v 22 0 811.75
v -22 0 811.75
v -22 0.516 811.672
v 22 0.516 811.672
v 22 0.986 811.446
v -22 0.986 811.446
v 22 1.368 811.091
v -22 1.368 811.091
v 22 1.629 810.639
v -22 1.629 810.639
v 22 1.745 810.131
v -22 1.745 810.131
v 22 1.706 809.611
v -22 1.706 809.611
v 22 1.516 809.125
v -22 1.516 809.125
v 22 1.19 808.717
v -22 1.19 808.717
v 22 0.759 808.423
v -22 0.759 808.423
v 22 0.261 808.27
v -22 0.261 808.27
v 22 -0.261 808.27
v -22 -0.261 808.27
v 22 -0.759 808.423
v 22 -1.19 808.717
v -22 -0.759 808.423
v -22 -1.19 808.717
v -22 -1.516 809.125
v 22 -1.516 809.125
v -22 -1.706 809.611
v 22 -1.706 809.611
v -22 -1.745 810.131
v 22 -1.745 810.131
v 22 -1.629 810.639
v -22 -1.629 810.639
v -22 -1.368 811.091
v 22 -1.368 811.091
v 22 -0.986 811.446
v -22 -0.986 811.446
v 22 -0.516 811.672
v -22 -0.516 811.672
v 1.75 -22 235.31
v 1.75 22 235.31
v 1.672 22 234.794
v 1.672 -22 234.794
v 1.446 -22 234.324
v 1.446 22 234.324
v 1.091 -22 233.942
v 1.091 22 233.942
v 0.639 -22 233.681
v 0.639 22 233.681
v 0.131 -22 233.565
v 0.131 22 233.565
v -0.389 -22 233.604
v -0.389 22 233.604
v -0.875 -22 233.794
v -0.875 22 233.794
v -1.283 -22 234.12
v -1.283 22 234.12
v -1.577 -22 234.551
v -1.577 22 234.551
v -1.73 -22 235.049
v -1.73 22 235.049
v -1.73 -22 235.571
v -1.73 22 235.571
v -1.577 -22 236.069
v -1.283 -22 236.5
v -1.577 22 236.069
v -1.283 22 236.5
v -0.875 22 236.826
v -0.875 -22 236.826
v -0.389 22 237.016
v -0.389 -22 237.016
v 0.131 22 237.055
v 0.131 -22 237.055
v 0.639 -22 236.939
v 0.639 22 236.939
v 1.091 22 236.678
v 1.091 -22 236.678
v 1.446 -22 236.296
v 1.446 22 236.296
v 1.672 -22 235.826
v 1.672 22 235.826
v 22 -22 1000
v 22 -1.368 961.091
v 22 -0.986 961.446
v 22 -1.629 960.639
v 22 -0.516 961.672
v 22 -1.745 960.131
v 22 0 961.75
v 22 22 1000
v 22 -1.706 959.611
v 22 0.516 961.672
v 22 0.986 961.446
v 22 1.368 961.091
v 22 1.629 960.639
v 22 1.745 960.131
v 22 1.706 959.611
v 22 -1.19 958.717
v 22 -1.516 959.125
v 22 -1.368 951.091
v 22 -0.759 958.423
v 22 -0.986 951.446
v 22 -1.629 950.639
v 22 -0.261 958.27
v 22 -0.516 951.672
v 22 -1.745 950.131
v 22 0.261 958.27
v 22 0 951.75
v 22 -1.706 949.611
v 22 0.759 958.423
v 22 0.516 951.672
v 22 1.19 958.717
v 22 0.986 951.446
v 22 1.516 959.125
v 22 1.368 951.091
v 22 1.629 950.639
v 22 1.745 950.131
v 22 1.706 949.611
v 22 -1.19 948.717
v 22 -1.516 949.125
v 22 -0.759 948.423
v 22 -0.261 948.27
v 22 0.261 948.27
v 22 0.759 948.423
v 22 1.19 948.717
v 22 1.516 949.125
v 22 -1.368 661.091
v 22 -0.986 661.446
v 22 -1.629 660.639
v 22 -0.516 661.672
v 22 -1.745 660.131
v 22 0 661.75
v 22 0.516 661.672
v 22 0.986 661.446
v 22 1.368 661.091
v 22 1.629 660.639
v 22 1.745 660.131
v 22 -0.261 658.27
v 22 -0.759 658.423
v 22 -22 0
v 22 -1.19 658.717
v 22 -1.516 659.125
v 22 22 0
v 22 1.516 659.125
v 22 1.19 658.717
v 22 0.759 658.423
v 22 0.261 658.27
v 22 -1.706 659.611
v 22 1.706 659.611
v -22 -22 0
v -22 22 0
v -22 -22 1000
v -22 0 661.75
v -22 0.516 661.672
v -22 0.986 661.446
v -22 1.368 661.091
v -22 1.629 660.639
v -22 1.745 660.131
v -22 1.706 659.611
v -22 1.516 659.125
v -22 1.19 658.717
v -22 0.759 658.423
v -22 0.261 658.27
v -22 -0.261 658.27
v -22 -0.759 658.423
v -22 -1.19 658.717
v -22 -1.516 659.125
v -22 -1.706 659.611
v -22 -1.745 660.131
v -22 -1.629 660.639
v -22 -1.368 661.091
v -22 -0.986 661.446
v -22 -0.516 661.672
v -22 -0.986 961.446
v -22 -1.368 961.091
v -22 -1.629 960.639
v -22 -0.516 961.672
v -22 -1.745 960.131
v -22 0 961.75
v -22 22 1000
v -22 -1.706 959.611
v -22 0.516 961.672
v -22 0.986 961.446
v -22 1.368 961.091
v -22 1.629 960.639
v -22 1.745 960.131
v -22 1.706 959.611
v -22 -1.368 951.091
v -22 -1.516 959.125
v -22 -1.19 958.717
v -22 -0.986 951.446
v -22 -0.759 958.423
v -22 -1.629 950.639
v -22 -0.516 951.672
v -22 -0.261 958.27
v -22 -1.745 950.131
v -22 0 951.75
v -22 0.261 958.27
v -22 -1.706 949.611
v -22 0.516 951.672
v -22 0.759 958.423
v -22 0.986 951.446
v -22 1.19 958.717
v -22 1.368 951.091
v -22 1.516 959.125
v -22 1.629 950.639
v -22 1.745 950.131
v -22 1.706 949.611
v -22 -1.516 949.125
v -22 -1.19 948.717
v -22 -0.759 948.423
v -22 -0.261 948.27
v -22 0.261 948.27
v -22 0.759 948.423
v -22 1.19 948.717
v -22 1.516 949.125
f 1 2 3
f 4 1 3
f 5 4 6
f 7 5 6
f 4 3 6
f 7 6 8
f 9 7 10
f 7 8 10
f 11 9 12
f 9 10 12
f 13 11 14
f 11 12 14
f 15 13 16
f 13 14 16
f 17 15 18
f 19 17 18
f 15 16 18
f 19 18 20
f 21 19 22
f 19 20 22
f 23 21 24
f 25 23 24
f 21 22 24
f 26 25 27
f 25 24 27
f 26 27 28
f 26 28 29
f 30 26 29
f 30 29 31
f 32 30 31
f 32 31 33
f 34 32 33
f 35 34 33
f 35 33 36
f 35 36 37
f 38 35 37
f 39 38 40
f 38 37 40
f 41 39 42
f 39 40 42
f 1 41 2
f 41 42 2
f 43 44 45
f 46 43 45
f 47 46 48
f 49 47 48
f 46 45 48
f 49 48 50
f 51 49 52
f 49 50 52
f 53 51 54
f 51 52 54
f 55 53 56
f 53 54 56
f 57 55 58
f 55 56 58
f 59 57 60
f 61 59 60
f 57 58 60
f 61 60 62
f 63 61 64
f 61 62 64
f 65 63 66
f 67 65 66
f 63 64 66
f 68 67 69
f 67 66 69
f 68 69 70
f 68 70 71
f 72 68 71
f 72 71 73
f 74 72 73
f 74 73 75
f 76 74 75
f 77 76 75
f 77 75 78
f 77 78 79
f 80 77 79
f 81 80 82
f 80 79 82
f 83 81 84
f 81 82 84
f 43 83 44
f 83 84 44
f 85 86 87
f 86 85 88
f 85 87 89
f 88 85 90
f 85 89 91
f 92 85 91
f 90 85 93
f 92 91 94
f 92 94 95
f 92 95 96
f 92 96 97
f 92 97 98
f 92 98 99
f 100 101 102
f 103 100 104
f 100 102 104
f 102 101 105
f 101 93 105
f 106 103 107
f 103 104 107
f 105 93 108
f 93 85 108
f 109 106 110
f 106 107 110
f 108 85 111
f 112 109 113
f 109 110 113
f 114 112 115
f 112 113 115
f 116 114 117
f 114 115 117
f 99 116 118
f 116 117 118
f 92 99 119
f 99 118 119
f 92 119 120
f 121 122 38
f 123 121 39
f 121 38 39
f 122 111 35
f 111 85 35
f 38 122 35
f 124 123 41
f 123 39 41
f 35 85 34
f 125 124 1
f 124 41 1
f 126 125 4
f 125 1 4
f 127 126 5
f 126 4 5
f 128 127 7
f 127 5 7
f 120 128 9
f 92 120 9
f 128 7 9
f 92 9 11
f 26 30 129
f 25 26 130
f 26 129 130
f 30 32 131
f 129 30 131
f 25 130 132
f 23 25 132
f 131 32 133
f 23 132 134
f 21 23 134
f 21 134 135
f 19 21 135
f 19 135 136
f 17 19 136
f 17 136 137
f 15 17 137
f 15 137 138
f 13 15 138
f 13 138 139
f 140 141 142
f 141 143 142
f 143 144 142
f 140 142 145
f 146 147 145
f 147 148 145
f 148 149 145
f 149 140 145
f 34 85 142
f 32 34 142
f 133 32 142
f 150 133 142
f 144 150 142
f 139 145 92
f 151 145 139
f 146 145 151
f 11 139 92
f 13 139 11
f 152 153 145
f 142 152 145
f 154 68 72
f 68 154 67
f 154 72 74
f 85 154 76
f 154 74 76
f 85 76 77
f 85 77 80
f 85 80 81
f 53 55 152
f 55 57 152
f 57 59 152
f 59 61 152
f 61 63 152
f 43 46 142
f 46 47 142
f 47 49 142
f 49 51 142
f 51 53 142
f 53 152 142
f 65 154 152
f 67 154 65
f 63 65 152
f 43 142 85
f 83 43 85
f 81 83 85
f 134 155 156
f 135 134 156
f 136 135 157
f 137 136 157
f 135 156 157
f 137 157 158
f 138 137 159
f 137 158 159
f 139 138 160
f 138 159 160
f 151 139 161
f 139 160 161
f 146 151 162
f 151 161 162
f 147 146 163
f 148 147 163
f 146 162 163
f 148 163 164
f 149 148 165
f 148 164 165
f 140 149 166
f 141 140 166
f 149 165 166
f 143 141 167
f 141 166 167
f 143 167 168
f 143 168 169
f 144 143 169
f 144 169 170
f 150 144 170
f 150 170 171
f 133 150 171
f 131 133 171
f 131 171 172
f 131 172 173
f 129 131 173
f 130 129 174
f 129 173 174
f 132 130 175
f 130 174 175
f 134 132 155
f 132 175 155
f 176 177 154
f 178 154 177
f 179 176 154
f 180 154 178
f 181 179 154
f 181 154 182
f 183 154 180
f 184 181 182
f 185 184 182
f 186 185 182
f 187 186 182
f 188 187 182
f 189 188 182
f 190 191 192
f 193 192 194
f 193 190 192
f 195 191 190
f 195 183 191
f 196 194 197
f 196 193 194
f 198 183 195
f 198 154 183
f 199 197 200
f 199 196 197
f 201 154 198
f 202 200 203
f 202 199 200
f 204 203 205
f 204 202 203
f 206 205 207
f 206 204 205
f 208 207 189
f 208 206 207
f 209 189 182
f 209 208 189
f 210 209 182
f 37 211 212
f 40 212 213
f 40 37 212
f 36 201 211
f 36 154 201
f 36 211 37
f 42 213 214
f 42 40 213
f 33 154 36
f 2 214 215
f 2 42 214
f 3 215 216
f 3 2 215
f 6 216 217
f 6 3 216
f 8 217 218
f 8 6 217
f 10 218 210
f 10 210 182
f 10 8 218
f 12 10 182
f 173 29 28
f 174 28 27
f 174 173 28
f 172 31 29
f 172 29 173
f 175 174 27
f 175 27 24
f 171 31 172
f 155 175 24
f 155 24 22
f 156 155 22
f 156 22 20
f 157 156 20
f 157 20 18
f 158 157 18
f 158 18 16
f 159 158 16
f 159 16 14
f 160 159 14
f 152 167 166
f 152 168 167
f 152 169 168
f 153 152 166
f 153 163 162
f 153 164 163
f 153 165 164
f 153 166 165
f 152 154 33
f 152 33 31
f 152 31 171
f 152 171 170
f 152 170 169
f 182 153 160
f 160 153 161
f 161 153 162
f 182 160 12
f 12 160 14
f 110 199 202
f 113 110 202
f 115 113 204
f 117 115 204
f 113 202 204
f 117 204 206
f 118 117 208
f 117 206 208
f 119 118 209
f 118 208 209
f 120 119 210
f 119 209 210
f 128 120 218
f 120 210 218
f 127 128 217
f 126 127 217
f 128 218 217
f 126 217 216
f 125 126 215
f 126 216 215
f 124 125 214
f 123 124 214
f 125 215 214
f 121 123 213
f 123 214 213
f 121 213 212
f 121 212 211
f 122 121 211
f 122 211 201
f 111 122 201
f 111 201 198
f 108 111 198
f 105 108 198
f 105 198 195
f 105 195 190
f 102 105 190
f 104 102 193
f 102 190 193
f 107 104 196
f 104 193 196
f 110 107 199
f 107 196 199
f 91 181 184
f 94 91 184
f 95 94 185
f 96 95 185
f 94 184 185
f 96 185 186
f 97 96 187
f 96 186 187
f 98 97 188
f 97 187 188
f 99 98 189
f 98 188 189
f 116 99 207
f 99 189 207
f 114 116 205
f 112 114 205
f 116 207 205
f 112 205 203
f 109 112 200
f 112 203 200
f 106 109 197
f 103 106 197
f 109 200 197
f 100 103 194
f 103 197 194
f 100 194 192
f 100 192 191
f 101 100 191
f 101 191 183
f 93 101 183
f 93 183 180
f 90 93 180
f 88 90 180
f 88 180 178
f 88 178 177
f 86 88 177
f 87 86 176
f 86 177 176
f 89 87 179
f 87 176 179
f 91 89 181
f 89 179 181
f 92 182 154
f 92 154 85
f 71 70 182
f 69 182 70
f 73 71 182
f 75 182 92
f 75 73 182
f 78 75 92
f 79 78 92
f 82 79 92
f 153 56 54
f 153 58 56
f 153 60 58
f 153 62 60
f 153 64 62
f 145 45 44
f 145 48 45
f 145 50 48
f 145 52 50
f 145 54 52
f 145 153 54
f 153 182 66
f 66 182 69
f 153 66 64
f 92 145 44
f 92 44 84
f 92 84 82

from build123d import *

# Parameters (mm, degrees)
ESQUISSE1_W             = 44
ESQUISSE1_H             = 44
BOSS_EXTRU_1_DEPTH      = 1000
ESQUISSE2_R             = 1.75
ENL_V_MAT_EXTRU_1_DEPTH = 44
ESQUISSE3_R             = 1.75
ENL_V_MAT_EXTRU_2_DEPTH = 44


with BuildPart() as part:
    # Esquisse1 → Boss.-Extru.1 (new body)
    with BuildSketch(Plane.XY):
        Rectangle(ESQUISSE1_W, ESQUISSE1_H)
    extrude(amount=BOSS_EXTRU_1_DEPTH)

    # Esquisse2 → Enlèv. mat.-Extru.1 (cut)
    with BuildSketch(Plane.ZY.offset(22)):
        with Locations((950, 0)):
            Circle(ESQUISSE2_R)
        with Locations((960, 0)):
            Circle(ESQUISSE2_R)
        with Locations((810, 0)):
            Circle(ESQUISSE2_R)
        with Locations((660, 0)):
            Circle(ESQUISSE2_R)
    extrude(amount=-ENL_V_MAT_EXTRU_1_DEPTH, mode=Mode.SUBTRACT)

    # Esquisse3 → Enlèv. mat.-Extru.2 (cut)
    with BuildSketch(Plane(origin=(0, 22, 0), x_dir=(1, 0, 0), z_dir=(0, 1, 0))):
        with Locations((0, -235.31)):
            Circle(ESQUISSE3_R)
    extrude(amount=-ENL_V_MAT_EXTRU_2_DEPTH, mode=Mode.SUBTRACT)


solid = part.part
